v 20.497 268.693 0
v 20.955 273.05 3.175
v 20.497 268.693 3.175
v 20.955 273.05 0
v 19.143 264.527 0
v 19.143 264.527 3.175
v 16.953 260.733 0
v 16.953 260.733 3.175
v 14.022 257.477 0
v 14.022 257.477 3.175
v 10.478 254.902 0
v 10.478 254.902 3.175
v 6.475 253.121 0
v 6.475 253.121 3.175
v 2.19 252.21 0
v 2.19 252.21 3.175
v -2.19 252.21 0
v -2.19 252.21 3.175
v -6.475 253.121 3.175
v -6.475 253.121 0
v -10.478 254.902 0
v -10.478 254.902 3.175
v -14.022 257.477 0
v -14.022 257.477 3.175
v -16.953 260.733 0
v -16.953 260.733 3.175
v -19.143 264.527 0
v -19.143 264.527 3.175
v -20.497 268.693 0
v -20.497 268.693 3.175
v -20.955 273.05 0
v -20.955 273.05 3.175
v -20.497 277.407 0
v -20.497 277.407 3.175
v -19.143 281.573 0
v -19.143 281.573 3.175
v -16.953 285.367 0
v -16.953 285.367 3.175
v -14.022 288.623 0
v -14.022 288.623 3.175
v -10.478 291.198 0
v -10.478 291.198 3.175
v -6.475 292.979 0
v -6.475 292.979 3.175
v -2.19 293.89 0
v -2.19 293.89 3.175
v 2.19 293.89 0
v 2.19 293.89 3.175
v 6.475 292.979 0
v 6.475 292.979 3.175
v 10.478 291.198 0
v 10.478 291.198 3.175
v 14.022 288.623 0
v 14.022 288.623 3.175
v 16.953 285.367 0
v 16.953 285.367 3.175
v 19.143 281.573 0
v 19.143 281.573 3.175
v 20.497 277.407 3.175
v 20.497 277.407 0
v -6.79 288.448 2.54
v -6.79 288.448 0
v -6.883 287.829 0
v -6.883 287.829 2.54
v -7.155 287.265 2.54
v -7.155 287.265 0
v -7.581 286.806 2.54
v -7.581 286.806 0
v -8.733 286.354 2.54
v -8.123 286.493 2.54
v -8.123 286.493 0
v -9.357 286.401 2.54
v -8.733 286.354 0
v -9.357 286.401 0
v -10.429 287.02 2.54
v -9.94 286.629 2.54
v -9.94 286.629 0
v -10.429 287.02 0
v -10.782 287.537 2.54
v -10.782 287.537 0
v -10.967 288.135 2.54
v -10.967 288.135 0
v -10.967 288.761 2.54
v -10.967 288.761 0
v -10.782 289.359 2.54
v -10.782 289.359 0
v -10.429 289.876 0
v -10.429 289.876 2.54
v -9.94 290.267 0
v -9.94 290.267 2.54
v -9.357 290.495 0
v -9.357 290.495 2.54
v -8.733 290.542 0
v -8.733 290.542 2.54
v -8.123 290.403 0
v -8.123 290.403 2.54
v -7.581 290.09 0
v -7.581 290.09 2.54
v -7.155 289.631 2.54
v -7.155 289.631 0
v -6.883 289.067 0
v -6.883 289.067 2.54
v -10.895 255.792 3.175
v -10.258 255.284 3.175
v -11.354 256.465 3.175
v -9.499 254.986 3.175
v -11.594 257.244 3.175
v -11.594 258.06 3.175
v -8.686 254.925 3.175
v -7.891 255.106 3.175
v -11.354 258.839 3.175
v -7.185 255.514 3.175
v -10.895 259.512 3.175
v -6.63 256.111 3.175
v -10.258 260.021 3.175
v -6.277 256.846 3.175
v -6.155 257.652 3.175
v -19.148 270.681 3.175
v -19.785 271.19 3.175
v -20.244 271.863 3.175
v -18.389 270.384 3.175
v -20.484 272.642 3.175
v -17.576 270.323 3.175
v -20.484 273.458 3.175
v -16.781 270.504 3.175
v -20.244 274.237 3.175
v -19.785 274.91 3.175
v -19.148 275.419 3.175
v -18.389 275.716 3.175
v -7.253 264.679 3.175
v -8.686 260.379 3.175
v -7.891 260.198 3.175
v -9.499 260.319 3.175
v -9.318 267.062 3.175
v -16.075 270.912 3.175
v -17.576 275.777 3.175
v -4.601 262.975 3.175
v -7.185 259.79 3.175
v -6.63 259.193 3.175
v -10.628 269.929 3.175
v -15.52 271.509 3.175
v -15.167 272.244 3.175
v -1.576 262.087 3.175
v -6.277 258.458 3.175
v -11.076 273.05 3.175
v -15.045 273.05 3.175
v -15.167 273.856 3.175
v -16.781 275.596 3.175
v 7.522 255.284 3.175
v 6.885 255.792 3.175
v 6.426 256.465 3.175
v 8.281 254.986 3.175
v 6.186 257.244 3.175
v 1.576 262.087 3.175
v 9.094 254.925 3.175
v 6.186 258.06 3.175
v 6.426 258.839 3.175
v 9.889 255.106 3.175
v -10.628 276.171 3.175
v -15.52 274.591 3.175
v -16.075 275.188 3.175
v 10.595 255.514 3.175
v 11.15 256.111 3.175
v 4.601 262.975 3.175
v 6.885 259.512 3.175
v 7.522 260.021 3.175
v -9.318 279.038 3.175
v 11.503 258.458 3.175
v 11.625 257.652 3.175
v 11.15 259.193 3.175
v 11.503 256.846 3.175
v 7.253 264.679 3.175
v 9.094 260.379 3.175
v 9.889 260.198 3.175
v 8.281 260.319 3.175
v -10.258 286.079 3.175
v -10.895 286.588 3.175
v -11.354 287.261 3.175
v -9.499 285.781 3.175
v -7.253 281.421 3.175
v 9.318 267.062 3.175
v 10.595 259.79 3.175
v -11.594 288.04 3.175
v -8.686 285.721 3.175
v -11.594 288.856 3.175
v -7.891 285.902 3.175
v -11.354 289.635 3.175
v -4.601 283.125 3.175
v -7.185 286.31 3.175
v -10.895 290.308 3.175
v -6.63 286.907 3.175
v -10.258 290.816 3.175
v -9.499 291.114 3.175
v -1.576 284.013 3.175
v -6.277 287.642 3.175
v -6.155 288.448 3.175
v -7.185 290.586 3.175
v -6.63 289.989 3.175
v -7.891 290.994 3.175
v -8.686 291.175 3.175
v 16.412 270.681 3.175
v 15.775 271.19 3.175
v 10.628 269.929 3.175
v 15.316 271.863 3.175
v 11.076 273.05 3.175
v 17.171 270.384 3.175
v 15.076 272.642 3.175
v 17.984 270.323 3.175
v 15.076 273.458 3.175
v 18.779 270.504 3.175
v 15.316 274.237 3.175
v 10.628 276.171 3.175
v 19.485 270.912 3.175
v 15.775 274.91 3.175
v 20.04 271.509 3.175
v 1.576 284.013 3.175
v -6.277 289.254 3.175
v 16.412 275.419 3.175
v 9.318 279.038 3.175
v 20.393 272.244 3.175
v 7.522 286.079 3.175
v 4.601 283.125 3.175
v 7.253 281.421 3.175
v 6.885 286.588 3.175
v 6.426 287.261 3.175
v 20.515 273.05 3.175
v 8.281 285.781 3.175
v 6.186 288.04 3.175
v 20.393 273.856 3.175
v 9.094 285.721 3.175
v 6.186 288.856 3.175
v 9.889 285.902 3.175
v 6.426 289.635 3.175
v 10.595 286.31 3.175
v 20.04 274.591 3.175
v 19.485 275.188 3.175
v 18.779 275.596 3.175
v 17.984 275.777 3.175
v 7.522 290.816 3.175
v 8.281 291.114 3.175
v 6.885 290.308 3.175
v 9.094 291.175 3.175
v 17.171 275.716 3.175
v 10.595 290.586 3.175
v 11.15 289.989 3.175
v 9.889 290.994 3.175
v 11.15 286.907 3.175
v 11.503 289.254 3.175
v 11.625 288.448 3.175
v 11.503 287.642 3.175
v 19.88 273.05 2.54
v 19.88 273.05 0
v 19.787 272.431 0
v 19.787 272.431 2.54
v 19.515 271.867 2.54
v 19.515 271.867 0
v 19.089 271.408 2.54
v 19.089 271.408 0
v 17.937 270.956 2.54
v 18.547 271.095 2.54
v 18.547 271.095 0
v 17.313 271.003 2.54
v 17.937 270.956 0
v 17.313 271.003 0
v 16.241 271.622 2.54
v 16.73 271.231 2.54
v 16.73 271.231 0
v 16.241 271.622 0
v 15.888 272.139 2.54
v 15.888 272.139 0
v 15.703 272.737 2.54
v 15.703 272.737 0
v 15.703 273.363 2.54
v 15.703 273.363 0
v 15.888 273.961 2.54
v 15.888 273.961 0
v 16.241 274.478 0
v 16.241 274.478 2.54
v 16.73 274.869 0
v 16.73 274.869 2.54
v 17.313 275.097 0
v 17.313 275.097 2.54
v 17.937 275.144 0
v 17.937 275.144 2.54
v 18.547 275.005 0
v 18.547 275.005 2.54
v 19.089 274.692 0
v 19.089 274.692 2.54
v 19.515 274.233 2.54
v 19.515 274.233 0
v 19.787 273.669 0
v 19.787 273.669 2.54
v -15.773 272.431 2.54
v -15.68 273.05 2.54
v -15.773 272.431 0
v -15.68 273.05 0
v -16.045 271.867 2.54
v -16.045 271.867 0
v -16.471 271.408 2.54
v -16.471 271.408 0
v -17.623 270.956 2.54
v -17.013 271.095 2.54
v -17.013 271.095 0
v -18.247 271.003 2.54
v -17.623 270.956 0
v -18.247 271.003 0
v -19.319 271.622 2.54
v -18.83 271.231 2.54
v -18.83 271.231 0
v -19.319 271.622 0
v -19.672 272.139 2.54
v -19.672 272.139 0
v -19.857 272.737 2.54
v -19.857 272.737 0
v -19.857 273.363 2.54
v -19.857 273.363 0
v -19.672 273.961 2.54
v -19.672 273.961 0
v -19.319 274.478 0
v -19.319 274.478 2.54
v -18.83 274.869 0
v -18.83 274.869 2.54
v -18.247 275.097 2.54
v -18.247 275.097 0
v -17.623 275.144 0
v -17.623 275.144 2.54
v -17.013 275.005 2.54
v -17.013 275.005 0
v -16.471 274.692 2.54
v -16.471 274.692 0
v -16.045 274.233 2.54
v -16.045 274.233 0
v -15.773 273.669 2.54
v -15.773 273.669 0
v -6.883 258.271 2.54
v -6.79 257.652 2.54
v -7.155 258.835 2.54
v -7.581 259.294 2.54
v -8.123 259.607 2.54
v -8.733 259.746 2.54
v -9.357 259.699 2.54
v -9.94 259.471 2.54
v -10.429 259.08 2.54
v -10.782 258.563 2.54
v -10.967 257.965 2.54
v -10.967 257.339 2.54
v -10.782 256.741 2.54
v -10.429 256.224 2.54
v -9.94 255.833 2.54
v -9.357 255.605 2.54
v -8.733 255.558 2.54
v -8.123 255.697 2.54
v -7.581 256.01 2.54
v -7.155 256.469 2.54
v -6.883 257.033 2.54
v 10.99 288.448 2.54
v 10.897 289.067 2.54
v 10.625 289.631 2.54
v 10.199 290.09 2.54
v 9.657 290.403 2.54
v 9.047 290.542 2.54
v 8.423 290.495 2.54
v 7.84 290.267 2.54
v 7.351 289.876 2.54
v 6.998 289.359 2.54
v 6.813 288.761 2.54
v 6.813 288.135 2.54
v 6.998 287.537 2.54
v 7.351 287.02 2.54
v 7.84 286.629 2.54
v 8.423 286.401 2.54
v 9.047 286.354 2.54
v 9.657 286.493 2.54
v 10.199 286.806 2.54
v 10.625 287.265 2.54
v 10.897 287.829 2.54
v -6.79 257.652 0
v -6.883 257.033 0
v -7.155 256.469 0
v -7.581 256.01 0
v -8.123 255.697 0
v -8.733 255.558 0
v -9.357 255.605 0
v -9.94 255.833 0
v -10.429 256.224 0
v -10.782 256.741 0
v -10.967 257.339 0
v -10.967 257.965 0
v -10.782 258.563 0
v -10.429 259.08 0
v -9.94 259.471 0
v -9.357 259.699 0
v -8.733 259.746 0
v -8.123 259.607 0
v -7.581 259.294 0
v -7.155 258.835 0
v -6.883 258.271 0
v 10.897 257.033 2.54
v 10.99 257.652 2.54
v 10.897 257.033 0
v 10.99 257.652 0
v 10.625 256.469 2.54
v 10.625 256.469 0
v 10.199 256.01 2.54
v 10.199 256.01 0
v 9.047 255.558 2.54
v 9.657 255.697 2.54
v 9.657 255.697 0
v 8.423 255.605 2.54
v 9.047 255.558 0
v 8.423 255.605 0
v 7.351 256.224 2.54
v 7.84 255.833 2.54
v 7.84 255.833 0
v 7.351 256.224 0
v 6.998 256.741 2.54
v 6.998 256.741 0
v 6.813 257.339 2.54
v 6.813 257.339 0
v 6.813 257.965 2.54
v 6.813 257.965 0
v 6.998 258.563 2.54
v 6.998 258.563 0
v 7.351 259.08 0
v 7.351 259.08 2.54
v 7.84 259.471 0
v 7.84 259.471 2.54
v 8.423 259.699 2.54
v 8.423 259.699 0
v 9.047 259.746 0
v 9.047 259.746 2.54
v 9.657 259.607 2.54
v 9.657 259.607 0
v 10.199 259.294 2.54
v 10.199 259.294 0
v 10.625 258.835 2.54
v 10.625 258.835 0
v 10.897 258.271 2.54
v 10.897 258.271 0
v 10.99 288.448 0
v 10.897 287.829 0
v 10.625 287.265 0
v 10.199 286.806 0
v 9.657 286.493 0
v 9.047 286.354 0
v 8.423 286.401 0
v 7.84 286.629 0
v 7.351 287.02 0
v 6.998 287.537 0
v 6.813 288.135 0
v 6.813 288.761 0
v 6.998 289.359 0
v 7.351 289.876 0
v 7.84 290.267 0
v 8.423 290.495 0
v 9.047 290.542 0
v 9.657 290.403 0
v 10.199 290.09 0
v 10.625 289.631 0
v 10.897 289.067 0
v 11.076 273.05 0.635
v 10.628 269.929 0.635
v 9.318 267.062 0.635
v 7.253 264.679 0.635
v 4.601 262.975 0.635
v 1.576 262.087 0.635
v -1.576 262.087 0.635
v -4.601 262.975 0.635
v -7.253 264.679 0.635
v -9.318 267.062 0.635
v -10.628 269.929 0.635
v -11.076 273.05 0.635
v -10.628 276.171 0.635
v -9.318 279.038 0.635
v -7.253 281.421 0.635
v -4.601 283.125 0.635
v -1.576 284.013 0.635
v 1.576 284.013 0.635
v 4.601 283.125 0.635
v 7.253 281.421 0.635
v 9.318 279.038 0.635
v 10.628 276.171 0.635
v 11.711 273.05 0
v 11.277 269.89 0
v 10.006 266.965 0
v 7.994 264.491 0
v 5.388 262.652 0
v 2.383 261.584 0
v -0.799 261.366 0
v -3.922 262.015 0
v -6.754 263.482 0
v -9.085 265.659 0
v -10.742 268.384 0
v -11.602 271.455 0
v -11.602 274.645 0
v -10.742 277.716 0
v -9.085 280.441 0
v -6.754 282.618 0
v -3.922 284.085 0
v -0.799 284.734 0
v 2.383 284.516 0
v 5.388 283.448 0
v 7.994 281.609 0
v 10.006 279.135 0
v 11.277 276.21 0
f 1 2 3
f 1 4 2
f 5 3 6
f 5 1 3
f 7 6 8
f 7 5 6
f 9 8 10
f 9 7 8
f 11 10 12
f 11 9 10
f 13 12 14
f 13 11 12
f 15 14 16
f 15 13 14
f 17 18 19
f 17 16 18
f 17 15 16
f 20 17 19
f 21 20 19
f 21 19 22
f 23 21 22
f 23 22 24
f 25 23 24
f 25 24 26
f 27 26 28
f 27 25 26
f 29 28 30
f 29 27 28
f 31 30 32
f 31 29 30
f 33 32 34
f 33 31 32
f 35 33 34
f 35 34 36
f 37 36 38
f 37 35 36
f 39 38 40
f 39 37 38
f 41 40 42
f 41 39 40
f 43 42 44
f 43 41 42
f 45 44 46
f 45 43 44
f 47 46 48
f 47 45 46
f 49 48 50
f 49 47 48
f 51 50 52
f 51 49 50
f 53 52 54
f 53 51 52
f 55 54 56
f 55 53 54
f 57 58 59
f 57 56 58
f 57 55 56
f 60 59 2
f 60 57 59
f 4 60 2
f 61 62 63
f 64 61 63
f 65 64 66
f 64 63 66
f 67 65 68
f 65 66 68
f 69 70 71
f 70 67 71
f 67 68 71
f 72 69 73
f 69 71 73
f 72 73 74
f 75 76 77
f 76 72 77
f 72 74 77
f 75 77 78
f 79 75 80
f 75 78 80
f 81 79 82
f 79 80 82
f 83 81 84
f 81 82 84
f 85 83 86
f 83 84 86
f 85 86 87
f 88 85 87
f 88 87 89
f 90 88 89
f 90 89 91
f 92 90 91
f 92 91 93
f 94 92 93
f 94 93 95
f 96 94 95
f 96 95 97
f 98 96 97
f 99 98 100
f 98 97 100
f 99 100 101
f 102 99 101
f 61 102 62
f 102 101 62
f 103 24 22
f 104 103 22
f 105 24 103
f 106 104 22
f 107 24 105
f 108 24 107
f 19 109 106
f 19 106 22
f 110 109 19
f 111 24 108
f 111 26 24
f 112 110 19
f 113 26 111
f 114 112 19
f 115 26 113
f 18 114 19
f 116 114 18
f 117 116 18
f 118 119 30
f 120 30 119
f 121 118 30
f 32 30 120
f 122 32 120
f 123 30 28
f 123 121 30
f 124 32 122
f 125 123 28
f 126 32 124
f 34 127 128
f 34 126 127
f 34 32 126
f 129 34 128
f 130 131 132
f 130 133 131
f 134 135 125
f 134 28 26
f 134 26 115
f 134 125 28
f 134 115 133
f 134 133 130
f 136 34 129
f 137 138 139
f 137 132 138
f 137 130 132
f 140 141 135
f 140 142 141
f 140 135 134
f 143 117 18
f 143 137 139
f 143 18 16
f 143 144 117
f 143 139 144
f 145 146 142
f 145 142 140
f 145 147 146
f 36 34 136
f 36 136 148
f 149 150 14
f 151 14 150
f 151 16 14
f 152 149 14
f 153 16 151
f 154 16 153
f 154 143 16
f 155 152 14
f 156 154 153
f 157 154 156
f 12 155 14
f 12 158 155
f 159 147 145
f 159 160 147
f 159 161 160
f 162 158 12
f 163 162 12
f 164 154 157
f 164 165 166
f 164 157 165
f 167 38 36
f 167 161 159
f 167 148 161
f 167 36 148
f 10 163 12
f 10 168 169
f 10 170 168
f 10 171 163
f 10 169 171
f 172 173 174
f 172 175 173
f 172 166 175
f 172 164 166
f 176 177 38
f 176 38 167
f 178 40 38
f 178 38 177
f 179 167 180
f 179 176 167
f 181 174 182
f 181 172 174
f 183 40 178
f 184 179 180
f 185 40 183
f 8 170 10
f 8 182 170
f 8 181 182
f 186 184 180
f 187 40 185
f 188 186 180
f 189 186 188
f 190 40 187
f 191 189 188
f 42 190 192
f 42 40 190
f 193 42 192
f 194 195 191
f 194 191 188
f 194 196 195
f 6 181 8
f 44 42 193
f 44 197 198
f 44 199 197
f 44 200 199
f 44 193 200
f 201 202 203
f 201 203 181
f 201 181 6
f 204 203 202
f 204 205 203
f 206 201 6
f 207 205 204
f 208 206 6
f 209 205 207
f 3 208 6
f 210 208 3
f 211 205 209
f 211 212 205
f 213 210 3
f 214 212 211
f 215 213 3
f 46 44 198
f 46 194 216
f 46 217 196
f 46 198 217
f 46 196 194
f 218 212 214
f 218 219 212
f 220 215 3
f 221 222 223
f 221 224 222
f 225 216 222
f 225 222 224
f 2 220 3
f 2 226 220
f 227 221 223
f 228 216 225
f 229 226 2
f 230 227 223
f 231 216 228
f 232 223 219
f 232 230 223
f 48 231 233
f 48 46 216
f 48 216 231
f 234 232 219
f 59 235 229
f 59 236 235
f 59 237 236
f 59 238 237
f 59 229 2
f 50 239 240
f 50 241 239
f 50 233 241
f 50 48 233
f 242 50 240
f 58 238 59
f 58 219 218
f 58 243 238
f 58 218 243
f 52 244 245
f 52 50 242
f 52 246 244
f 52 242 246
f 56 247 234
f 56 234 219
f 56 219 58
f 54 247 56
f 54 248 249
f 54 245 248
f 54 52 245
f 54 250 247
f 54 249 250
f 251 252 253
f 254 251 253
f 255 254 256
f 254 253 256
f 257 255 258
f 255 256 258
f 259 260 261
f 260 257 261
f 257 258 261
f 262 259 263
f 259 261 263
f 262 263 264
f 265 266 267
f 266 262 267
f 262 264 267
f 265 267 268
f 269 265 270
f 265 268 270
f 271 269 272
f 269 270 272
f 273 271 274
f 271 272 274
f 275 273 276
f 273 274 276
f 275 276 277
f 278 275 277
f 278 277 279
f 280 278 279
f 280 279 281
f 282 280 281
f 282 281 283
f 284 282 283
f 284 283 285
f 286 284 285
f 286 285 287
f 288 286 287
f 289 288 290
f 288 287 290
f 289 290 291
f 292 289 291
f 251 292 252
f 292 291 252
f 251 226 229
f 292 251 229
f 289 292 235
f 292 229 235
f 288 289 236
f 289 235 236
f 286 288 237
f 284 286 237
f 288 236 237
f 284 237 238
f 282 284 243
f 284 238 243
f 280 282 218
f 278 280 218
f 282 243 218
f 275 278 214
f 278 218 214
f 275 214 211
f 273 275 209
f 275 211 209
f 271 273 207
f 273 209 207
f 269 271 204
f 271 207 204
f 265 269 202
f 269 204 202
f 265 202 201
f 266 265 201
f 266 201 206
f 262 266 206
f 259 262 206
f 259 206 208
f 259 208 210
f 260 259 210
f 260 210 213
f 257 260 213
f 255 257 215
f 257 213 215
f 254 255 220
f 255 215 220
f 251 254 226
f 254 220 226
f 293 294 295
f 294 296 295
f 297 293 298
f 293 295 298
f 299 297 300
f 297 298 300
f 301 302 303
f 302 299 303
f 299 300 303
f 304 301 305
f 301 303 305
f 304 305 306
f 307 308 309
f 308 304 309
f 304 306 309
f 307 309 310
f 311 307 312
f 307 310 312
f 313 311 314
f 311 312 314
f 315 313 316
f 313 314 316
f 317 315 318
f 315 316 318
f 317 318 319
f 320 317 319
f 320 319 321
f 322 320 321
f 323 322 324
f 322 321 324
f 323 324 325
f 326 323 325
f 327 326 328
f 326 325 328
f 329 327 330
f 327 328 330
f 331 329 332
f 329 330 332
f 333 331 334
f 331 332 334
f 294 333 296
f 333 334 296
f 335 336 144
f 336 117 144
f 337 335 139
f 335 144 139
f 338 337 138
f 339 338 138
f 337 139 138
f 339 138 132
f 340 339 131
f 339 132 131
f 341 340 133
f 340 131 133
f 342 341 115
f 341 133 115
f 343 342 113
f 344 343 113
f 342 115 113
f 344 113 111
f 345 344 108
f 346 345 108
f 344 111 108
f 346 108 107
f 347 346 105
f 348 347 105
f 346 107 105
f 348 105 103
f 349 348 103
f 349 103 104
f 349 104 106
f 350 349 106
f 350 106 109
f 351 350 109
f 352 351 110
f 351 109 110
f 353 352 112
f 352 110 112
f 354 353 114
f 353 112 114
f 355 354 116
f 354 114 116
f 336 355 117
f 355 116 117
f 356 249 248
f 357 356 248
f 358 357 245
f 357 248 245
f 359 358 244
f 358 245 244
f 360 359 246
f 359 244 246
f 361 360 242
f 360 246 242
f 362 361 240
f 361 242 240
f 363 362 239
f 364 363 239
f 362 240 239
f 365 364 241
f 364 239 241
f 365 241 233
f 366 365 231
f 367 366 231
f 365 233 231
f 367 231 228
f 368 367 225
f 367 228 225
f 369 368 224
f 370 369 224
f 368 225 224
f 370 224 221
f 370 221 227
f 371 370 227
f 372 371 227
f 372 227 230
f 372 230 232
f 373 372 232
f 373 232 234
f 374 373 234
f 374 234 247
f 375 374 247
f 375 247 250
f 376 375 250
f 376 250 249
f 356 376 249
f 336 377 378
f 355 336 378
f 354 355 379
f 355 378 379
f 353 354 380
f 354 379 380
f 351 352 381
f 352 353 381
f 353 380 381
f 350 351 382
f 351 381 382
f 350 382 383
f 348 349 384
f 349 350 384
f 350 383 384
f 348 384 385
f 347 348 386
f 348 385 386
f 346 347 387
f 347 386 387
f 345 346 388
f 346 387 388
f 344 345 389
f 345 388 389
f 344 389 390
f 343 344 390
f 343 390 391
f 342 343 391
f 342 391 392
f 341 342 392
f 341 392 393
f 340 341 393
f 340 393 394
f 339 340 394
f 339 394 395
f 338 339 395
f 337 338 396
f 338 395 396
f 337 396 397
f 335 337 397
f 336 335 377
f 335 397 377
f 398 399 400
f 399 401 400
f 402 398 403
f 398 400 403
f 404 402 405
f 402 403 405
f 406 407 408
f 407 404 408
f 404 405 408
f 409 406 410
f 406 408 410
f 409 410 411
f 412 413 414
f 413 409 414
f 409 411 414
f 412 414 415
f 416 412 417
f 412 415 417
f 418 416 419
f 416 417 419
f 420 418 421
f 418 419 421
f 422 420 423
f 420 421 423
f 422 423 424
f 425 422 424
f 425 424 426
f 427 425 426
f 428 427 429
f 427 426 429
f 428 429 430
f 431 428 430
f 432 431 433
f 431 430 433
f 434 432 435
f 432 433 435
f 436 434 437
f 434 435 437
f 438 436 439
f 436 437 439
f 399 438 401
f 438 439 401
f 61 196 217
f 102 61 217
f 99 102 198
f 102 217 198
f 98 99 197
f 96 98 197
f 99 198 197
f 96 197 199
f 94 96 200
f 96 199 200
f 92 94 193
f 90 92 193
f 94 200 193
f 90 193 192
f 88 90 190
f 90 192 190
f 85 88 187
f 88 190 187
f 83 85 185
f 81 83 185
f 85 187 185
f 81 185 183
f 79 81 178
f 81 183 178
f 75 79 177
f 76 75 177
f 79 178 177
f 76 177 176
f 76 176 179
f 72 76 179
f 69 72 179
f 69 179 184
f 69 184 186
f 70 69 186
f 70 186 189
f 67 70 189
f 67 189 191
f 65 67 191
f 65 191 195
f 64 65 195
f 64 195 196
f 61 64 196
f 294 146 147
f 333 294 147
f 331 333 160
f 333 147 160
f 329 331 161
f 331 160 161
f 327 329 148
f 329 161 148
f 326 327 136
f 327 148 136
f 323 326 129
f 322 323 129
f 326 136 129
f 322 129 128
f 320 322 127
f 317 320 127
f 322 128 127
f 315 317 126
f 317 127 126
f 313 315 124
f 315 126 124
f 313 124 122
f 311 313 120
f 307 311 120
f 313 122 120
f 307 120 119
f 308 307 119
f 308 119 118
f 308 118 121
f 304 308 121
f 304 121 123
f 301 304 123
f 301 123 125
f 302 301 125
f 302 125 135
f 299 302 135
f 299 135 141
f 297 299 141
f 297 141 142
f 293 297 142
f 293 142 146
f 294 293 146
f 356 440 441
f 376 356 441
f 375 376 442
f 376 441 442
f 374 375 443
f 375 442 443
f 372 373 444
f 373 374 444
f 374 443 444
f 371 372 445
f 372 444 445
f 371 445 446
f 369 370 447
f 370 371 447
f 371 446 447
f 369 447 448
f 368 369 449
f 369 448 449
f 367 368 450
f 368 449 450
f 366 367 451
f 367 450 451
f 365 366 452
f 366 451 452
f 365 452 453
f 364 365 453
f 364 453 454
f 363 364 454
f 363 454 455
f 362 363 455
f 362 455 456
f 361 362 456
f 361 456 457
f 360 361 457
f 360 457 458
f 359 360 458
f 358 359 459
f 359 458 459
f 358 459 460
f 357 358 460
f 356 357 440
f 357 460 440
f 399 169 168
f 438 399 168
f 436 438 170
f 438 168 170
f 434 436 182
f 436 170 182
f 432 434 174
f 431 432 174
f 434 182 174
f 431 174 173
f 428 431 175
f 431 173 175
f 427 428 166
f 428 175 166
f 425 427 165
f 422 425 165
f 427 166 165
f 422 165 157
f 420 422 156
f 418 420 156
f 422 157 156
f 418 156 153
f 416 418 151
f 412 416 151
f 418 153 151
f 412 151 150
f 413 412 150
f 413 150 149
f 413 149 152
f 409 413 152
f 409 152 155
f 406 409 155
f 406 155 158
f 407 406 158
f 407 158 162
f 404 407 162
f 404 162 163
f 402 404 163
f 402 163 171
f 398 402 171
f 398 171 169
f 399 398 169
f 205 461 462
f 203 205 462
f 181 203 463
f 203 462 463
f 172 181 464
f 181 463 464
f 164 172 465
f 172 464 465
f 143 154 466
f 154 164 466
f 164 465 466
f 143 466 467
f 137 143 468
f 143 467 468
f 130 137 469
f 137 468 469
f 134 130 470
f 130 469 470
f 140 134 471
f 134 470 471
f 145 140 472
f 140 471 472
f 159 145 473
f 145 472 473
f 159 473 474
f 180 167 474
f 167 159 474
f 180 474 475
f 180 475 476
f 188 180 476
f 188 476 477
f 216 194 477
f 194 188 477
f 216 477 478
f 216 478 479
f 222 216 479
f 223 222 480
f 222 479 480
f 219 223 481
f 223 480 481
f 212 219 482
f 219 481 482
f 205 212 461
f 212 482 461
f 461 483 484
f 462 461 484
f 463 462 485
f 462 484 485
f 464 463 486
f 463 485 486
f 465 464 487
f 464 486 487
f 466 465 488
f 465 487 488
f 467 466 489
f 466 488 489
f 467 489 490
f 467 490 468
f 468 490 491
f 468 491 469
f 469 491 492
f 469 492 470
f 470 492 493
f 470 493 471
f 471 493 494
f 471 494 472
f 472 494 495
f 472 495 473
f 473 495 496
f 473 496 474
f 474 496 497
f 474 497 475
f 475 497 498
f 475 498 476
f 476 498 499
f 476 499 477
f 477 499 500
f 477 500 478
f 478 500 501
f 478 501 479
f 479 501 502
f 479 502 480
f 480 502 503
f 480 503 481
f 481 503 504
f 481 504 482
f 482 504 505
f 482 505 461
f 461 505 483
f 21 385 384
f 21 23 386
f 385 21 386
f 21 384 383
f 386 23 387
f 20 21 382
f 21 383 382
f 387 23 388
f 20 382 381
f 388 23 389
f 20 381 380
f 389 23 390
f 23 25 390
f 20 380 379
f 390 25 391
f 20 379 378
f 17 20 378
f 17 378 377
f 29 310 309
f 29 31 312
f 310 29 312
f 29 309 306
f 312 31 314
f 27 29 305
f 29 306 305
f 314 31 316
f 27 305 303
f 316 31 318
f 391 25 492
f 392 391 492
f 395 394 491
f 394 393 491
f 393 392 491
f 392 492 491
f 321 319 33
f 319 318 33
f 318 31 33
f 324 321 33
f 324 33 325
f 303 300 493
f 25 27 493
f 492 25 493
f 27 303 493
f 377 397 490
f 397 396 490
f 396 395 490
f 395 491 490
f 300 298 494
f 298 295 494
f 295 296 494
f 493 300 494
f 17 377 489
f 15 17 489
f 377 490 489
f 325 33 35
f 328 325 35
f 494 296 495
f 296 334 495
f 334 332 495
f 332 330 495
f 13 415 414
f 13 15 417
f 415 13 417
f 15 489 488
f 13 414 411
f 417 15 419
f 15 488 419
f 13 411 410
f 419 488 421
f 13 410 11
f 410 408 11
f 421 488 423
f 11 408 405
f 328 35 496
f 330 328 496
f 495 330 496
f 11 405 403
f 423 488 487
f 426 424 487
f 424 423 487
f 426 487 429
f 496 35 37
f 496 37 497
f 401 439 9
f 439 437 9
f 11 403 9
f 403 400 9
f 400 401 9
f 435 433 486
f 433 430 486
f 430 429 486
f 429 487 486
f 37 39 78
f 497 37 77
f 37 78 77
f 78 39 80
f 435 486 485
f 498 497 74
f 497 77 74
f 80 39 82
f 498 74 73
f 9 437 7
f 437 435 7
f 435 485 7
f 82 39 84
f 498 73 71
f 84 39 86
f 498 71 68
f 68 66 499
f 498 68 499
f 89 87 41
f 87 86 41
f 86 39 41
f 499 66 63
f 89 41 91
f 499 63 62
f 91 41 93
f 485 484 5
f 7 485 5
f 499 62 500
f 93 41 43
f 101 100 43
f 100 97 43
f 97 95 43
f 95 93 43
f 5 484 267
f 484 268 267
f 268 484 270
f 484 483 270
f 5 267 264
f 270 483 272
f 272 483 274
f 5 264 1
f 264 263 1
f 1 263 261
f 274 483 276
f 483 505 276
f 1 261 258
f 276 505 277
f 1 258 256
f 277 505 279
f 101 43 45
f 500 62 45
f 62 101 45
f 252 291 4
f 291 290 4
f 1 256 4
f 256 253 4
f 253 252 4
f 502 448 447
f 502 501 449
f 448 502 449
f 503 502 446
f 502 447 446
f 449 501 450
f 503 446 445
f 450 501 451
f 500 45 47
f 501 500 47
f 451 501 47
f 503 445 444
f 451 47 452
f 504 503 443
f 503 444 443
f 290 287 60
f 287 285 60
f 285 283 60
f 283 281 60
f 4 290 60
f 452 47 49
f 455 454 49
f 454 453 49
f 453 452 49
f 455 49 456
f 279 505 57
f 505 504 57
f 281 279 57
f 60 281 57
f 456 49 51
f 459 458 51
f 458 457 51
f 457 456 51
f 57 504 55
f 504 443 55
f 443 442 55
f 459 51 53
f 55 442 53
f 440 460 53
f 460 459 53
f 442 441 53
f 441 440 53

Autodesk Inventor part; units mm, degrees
ref_plane "YZ Plane" through (0, 0, 0) normal (1, 0, 0) x (0, 1, 0)
ref_plane "XZ Plane" through (0, 0, 0) normal (0, 1, 0) x (-1, 0, 0)
ref_plane "XY Plane" through (0, 0, 0) normal (0, 0, 1) x (1, 0, 0)
sketch "Sketch1" plane through (0, 0, 0) normal (0, 0, 1) x (1, 0, 0)
  arc A0 (219.754, -304.8) -> (225.7704, -296.4188) centre (219.754, -298.45) ccw projected
  line L0 (225.7704, -296.4188) -> (30.0819, 283.206) projected
  arc A1 (30.0819, 283.206) -> (-30.0819, 283.206) centre (0, 273.05) ccw projected
  line L1 (-30.0819, 283.206) -> (-225.7704, -296.4188) projected
  arc A2 (-225.7704, -296.4188) -> (-219.754, -304.8) centre (-219.754, -298.45) ccw projected
  line L2 (-219.754, -304.8) -> (219.754, -304.8) projected
  line L3 (-38.1, -17.4222) -> (-38.1, -222.25) projected
  arc A3 (-44.45, -228.6) -> (-38.1, -222.25) centre (-44.45, -222.25) ccw projected
  line L4 (-44.45, -228.6) -> (-113.6024, -228.6) projected
  arc A4 (-119.6188, -220.2188) -> (-113.6024, -228.6) centre (-113.6024, -222.25) ccw projected
  line L5 (-119.6188, -220.2188) -> (-50.4664, -15.391) projected
  arc A5 (-38.1, -17.4222) -> (-50.4664, -15.391) centre (-44.45, -17.4222) ccw projected
  line L6 (113.6024, -228.6) -> (44.45, -228.6) projected
  arc A6 (38.1, -222.25) -> (44.45, -228.6) centre (44.45, -222.25) ccw projected
  line L7 (38.1, -222.25) -> (38.1, -17.4222) projected
  arc A7 (50.4664, -15.391) -> (38.1, -17.4222) centre (44.45, -17.4222) ccw projected
  line L8 (50.4664, -15.391) -> (119.6188, -220.2188) projected
  arc A8 (113.6024, -228.6) -> (119.6188, -220.2188) centre (113.6024, -222.25) ccw projected
  circle A9 centre (-204.2059, -292.1) radius 2 projected
  circle A10 centre (-187.0552, -241.3) radius 2 projected
  circle A11 centre (187.0552, -241.3) radius 2 projected
  circle A12 centre (204.2059, -292.1) radius 2 projected
  circle A13 centre (19.05, -241.3) radius 2 projected
  circle A14 centre (19.05, -292.1) radius 2 projected
  circle A15 centre (-19.05, -292.1) radius 2 projected
  circle A16 centre (-19.05, -241.3) radius 2 projected
  circle A17 centre (8.89, 288.4479) radius 2 projected
  circle A18 centre (-8.89, 288.4479) radius 2 projected
  circle A19 centre (-17.78, 273.05) radius 2 projected
  circle A20 centre (-8.89, 257.6521) radius 2 projected
  circle A21 centre (8.89, 257.6521) radius 2 projected
  circle A22 centre (17.78, 273.05) radius 2 projected
  circle A23 centre (0, 273.05) radius 11.0762
  circle A24 centre (0, 273.05) radius 20.955
  circle A25 centre (-8.89, 288.4479) radius 2.1
  circle A26 centre (8.89, 288.4479) radius 2.1
  circle A27 centre (17.78, 273.05) radius 2.1
  circle A28 centre (8.89, 257.6521) radius 2.1
  circle A29 centre (-8.89, 257.6521) radius 2.1
  circle A30 centre (-17.78, 273.05) radius 2.1
  ellipse E0 centre (0, 273.05) end of major axis (-12.7, 273.05) minor radius 12.2673 projected
  point P0 (0, 0)
  dimension "d1" = 41.91
  dimension "d2" = 4.2
  dimension "d3" = 4.2
  dimension "d4" = 4.2
  dimension "d5" = 4.2
  dimension "d6" = 4.2
  dimension "d7" = 4.2
extrude "Extrusion1" add sketch "Sketch1" along normal blind 3.175 contours A24 | E0
chamfer "Chamfer1" distance 0.635 angle 45 7 edges at (-11.0762, 273.05, 0) (-10.99, 288.4479, 3.175) (-19.88, 273.05, 3.175) (-10.99, 257.6521, 3.175) (6.79, 257.6521, 3.175) (15.68, 273.05, 3.175) (6.79, 288.4479, 3.175)
properties part number "MainInnerBearingMount"
